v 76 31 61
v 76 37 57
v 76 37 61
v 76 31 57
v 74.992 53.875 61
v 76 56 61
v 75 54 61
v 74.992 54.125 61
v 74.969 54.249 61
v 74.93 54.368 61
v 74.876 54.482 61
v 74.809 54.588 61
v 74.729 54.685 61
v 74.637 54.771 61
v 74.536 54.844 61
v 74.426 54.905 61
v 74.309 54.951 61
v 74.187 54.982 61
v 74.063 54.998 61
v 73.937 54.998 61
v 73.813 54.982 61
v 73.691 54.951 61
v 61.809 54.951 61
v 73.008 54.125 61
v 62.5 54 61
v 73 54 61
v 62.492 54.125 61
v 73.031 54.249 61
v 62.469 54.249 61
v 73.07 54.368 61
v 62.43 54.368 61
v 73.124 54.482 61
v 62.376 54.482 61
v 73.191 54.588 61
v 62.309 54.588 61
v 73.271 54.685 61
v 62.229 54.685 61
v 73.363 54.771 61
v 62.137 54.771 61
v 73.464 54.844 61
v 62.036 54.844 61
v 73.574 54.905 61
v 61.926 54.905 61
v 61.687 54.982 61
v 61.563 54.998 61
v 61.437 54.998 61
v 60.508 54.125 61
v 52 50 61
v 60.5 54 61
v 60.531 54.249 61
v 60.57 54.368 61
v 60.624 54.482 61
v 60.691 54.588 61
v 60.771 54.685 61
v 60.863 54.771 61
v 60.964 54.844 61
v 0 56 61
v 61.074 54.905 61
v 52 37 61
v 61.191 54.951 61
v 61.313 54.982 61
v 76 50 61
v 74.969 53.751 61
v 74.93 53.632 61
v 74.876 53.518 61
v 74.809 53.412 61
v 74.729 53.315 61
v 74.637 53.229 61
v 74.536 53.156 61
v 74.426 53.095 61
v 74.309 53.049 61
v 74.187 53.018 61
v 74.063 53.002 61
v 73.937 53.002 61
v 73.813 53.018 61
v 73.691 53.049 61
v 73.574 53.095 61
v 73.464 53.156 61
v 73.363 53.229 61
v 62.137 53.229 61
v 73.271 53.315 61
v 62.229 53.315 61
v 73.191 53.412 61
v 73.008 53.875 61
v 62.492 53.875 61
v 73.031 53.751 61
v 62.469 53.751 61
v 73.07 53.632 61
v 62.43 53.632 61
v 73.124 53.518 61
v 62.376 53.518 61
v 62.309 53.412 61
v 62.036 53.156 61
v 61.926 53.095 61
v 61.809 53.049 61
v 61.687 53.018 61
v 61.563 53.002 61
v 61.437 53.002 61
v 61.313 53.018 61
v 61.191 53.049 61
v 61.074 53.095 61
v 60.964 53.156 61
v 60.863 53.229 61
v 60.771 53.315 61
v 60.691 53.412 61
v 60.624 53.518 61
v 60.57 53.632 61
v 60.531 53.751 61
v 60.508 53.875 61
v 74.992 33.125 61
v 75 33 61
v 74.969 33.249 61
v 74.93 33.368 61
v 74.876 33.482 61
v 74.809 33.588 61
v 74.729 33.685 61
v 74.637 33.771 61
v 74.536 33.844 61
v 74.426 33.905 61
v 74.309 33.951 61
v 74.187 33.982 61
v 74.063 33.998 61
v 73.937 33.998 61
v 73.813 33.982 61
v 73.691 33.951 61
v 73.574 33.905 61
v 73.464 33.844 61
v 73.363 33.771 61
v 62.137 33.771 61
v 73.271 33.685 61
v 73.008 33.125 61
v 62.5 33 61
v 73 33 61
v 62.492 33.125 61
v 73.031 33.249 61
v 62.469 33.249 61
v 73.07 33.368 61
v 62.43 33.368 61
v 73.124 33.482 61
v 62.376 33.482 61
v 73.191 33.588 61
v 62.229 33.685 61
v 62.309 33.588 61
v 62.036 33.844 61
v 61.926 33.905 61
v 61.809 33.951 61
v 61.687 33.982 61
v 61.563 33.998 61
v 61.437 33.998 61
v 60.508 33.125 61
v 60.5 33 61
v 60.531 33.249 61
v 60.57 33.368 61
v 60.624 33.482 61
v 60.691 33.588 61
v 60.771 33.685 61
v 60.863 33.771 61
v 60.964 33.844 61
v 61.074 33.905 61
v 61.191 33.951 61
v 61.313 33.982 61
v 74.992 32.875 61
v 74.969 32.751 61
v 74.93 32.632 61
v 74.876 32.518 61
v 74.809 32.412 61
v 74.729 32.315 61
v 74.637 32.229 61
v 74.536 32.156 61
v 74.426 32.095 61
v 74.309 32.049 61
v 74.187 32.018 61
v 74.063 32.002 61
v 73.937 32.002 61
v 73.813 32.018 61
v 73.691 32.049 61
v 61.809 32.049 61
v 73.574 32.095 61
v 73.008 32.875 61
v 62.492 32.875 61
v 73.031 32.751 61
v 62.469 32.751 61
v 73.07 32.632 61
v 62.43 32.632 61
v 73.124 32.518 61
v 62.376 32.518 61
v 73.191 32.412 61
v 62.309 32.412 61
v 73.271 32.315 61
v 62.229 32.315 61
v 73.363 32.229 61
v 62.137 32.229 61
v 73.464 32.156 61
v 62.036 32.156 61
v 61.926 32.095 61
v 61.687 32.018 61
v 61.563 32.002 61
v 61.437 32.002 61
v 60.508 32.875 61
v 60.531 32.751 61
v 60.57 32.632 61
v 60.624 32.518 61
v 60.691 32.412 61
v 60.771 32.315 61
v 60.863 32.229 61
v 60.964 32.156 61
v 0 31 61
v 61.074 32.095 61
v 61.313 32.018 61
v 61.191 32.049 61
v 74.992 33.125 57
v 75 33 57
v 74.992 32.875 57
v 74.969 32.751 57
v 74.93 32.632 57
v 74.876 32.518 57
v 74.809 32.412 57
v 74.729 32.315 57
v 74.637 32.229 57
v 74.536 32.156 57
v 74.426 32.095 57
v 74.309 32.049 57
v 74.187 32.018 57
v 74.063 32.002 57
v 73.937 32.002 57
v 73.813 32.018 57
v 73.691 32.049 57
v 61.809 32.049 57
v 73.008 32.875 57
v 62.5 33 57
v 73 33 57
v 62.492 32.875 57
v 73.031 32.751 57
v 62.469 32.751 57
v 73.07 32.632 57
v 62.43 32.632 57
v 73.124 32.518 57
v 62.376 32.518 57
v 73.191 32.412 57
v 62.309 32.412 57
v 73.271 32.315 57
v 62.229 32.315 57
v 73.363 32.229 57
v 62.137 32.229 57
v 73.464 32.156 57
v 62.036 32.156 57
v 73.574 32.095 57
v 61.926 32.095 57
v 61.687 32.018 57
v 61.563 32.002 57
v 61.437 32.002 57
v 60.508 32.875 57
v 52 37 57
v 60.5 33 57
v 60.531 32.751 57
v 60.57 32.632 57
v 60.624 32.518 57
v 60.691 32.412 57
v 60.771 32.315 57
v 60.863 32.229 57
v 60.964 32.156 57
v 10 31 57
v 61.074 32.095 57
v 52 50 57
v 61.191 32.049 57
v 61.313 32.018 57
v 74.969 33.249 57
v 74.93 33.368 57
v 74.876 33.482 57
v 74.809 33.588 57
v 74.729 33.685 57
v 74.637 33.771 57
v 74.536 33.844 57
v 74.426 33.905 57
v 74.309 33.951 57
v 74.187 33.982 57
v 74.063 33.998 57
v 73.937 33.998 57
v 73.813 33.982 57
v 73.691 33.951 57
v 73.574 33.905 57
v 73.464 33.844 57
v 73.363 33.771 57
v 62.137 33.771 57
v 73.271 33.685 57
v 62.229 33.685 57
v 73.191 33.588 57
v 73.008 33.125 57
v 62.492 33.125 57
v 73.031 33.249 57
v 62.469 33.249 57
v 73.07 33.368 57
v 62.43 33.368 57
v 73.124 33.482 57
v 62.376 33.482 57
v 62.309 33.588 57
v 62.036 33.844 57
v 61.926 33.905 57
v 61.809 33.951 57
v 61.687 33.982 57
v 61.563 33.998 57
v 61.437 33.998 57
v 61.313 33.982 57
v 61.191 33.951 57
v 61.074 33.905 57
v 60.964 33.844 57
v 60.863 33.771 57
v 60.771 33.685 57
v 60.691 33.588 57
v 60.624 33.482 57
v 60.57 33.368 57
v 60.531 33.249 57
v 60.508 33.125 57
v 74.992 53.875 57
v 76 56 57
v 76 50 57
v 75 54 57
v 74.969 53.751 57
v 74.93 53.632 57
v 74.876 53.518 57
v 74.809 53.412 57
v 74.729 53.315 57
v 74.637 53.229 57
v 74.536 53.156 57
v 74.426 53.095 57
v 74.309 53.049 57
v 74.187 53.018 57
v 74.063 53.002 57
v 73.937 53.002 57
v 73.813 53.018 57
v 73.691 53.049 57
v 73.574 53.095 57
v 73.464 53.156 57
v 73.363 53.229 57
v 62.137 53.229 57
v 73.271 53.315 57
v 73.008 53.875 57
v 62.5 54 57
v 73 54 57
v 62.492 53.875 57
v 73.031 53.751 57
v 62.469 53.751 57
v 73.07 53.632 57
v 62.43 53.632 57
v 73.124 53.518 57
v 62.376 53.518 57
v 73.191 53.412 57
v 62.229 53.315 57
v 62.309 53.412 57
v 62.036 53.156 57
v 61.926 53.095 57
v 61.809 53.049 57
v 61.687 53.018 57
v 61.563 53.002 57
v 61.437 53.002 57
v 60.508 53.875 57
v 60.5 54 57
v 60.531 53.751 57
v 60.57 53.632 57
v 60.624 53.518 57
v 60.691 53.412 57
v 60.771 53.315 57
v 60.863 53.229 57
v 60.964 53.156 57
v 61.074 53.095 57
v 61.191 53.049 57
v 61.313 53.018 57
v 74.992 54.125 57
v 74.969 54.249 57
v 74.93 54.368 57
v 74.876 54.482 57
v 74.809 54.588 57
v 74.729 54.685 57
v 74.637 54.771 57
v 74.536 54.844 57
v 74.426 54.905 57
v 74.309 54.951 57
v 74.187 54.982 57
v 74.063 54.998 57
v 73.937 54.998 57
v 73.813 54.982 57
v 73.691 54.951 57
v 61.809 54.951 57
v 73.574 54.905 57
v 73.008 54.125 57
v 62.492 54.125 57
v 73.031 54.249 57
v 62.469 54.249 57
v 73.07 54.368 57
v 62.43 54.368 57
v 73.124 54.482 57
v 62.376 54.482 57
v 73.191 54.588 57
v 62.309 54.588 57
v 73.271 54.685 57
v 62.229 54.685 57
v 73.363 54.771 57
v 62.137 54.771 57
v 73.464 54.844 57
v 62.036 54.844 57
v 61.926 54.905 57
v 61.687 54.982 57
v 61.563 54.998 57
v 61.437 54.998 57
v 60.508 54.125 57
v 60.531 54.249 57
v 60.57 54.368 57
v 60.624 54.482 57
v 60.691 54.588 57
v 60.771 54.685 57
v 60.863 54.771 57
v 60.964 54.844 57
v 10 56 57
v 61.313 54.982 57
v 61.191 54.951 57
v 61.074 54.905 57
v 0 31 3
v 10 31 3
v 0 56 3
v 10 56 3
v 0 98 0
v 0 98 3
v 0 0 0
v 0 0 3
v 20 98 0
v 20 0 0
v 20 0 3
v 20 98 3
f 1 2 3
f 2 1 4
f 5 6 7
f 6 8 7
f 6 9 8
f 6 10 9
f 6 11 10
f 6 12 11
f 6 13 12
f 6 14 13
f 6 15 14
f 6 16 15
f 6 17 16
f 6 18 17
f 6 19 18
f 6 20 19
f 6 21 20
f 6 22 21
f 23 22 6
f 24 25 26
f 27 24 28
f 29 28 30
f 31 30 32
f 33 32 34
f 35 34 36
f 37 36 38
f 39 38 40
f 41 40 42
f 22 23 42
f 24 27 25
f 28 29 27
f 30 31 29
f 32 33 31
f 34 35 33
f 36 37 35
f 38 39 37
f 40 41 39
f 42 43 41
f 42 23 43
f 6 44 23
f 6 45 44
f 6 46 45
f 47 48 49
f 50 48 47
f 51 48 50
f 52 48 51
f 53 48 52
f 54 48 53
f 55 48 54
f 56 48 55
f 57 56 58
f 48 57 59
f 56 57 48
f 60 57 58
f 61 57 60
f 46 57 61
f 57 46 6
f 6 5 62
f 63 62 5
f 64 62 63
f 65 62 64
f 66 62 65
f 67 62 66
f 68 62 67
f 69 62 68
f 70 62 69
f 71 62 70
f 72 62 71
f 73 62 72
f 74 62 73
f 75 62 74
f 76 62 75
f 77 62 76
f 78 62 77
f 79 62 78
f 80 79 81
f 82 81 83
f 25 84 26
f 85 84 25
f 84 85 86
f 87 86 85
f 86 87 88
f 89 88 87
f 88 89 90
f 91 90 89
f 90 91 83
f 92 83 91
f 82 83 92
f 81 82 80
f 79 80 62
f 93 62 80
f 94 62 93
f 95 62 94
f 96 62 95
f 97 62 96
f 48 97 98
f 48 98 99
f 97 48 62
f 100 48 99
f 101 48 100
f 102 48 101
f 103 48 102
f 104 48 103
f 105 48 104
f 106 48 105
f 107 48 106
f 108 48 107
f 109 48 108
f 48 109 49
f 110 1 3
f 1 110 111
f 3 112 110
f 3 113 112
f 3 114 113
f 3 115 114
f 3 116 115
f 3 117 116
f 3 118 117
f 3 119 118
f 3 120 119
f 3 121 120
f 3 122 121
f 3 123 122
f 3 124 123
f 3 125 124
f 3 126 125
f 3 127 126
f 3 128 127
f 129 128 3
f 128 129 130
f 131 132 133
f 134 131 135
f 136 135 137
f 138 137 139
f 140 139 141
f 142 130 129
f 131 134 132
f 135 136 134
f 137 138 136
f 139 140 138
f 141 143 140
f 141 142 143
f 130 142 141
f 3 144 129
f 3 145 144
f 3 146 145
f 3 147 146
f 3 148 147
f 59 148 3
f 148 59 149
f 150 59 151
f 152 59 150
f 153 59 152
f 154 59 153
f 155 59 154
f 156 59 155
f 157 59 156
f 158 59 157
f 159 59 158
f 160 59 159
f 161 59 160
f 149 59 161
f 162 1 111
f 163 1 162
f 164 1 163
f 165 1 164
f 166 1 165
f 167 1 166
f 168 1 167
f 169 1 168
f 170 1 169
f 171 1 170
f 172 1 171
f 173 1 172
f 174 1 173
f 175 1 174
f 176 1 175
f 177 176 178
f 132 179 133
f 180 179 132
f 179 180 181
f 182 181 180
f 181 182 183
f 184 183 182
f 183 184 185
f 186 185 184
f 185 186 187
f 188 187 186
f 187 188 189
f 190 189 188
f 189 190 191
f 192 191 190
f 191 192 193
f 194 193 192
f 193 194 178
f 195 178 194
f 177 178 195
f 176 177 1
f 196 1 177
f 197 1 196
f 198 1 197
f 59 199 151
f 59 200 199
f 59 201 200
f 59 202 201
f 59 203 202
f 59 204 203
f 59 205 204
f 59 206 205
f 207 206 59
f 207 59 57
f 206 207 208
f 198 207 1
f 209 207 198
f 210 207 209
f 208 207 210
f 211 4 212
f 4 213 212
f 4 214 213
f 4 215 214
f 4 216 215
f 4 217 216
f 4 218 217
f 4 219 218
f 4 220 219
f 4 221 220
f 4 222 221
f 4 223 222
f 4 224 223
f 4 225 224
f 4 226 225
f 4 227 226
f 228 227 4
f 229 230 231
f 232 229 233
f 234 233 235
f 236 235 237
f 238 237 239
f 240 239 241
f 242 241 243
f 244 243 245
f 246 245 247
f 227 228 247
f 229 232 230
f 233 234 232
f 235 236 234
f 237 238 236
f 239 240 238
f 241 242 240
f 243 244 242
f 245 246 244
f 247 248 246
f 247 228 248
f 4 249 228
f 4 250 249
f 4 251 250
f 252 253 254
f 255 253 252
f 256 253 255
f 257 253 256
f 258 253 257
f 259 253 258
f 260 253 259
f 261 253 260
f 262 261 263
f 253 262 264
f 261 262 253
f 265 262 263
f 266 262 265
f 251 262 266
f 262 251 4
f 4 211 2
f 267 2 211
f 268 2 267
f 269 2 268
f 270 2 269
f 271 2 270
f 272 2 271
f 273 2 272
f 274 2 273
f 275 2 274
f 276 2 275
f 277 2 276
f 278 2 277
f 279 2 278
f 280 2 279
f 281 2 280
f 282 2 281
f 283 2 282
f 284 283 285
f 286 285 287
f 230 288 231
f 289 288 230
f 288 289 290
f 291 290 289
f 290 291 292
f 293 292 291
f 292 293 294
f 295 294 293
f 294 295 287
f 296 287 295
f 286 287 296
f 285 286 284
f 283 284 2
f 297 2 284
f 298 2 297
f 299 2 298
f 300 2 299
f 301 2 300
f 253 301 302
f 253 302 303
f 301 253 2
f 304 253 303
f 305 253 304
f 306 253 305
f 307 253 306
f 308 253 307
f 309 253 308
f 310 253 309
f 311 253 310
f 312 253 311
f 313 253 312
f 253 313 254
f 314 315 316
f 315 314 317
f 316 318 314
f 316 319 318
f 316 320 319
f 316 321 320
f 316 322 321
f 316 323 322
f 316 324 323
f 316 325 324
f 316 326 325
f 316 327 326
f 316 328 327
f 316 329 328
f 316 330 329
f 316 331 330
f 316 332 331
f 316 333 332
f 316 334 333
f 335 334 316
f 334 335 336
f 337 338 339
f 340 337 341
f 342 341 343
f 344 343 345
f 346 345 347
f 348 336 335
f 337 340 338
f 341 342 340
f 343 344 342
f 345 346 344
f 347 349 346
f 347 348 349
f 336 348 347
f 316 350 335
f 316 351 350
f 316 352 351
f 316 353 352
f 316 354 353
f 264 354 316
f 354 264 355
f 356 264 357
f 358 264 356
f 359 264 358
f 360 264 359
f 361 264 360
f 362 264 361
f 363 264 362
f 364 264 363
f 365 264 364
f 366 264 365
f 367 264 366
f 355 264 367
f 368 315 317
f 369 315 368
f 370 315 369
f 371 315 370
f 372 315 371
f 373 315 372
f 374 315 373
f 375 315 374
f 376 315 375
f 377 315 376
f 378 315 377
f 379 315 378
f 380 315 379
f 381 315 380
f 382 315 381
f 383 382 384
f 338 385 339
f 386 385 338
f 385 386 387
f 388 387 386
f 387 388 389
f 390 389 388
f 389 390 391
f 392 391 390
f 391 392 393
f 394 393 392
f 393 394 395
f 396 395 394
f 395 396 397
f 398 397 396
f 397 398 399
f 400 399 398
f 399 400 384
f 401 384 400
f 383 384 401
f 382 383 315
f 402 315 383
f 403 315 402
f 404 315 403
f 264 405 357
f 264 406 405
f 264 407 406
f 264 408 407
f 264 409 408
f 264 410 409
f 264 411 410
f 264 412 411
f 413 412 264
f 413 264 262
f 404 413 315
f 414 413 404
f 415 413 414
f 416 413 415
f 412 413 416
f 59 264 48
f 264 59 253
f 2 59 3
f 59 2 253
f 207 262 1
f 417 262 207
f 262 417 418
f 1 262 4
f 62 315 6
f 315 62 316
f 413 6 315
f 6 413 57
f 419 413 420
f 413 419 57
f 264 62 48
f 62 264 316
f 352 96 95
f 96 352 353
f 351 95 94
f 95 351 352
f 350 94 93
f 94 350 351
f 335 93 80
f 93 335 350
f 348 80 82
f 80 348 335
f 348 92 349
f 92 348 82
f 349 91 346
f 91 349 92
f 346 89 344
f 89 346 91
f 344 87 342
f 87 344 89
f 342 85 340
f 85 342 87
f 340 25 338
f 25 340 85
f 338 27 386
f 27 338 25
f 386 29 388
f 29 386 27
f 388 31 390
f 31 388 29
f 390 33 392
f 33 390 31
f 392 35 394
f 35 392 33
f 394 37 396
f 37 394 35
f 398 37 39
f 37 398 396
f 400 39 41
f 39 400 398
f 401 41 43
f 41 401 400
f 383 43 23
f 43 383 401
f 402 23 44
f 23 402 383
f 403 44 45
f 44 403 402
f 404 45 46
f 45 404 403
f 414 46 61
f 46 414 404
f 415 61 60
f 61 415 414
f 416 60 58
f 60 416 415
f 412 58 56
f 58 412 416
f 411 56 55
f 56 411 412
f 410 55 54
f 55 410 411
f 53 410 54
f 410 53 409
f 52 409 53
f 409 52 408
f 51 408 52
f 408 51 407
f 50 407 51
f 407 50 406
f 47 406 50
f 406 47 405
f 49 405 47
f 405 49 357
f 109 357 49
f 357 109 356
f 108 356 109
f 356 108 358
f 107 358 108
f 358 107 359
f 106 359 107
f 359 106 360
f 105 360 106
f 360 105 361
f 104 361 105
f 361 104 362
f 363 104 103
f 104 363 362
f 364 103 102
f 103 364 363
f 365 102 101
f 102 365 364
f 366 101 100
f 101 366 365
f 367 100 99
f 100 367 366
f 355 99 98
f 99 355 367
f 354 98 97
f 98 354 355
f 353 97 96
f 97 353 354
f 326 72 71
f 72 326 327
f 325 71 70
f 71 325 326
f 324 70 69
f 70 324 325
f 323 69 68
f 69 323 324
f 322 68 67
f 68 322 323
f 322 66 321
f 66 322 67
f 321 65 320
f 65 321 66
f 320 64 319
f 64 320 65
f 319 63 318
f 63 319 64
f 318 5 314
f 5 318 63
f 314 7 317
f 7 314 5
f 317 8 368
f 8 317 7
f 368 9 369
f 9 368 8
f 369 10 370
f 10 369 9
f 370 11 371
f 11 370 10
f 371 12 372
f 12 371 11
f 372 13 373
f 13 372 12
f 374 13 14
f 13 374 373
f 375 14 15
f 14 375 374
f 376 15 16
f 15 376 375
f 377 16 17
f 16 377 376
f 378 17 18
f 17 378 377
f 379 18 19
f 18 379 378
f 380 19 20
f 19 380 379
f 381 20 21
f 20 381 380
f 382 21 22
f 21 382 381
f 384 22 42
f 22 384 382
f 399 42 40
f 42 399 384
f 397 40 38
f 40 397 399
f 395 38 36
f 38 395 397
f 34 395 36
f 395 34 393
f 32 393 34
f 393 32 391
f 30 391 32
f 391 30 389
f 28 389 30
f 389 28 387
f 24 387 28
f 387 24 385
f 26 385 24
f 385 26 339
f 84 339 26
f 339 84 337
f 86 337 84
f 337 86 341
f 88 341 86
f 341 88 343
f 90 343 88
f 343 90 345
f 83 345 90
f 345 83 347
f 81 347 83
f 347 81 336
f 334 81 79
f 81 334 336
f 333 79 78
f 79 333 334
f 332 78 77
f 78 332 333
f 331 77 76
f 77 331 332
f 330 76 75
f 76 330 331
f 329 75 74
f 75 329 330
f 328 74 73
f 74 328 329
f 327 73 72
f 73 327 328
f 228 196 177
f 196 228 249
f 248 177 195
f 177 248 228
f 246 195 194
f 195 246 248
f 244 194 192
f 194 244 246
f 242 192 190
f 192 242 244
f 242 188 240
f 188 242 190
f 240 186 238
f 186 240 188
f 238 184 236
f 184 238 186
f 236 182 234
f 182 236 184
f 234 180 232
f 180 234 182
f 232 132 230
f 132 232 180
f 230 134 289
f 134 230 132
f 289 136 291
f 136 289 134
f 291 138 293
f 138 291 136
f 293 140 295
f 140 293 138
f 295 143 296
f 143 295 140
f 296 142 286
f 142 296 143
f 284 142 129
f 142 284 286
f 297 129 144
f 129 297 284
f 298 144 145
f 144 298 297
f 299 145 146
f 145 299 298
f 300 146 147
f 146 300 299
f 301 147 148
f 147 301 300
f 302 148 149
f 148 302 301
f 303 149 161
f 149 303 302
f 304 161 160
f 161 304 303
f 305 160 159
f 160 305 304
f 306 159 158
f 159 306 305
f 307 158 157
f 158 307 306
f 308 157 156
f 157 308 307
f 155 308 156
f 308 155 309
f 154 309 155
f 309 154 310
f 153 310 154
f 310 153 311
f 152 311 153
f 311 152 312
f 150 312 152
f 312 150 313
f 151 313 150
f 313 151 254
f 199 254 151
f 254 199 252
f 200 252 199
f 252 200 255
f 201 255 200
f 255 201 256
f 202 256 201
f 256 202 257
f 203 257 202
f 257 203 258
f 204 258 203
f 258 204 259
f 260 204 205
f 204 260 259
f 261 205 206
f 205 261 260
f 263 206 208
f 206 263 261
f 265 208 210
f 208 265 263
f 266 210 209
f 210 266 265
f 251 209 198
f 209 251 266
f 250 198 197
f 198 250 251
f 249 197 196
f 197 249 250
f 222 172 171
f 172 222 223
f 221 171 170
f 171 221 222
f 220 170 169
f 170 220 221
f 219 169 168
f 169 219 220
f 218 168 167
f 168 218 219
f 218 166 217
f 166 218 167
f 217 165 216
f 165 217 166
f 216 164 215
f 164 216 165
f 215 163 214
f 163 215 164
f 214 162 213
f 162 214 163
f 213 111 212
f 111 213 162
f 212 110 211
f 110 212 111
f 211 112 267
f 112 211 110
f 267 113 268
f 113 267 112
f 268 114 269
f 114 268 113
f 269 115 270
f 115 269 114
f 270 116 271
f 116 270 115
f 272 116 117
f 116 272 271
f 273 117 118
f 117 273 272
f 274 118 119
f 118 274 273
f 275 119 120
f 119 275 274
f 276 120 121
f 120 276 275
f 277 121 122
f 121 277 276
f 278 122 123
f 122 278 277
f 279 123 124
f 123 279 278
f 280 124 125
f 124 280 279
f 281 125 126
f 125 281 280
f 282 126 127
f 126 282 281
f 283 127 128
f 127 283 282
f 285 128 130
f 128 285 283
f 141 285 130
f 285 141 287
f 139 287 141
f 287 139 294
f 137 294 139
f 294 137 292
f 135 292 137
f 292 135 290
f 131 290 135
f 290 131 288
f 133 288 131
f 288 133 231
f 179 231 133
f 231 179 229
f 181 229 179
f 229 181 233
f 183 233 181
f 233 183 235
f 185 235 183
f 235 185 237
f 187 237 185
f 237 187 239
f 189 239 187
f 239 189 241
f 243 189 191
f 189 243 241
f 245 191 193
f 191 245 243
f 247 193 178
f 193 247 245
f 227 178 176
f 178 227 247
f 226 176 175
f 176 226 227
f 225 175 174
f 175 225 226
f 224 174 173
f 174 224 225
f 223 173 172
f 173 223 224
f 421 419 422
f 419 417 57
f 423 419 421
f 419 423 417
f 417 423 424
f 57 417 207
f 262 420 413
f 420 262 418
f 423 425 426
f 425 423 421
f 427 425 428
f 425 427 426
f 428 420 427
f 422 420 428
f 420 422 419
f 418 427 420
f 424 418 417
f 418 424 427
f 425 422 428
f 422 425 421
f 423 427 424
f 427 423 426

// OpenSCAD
board_width = 98;

cam_x = 52;
cam_y = 31;
cam_z = 61;

arm_zl = 4;
mount_yl = 6;

// make the base
cube([20, board_width, 3]);

translate ([0, cam_y, 0]) {
    // vertical arm coming from base
    cube([10, cam_yl, cam_z]);

    translate([0,0, cam_z - arm_zl]) {
        // horizontal arm from vertical arm
        cube([cam_x, cam_yl, arm_zl]);

        translate([cam_x, 0, 0]) {
            mount();
        }
    }
}

// from https://www.raspberrypi-spy.co.uk/2013/05/pi-camera-module-mechanical-dimensions/
cam_zl = 1.07; // thickness
cam_yl = 25;   // across the port
cam_xl = 24;   // portside to far edge

module cam_holes(hole_thickness = 2) {
    translate([9.5,2]) {
        circle(diameter=hole_thickness, $fn = 50);
        translate([   0, 21]) circle(diameter=hole_thickness, $fn = 50);
        translate([12.5, 21]) circle(diameter=hole_thickness, $fn = 50);
        translate([12.5,  0]) circle(diameter=hole_thickness, $fn = 50);
    }
}

module mount() {
    difference() {
        union() {
            cube([cam_xl, mount_yl, arm_zl]);
            translate([0, cam_yl - mount_yl, 0])
                cube([cam_xl, mount_yl, arm_zl]);
        }
        translate([0,0,-0.5])
            linear_extrude(height=arm_zl+1)
            cam_holes();
    }
}
